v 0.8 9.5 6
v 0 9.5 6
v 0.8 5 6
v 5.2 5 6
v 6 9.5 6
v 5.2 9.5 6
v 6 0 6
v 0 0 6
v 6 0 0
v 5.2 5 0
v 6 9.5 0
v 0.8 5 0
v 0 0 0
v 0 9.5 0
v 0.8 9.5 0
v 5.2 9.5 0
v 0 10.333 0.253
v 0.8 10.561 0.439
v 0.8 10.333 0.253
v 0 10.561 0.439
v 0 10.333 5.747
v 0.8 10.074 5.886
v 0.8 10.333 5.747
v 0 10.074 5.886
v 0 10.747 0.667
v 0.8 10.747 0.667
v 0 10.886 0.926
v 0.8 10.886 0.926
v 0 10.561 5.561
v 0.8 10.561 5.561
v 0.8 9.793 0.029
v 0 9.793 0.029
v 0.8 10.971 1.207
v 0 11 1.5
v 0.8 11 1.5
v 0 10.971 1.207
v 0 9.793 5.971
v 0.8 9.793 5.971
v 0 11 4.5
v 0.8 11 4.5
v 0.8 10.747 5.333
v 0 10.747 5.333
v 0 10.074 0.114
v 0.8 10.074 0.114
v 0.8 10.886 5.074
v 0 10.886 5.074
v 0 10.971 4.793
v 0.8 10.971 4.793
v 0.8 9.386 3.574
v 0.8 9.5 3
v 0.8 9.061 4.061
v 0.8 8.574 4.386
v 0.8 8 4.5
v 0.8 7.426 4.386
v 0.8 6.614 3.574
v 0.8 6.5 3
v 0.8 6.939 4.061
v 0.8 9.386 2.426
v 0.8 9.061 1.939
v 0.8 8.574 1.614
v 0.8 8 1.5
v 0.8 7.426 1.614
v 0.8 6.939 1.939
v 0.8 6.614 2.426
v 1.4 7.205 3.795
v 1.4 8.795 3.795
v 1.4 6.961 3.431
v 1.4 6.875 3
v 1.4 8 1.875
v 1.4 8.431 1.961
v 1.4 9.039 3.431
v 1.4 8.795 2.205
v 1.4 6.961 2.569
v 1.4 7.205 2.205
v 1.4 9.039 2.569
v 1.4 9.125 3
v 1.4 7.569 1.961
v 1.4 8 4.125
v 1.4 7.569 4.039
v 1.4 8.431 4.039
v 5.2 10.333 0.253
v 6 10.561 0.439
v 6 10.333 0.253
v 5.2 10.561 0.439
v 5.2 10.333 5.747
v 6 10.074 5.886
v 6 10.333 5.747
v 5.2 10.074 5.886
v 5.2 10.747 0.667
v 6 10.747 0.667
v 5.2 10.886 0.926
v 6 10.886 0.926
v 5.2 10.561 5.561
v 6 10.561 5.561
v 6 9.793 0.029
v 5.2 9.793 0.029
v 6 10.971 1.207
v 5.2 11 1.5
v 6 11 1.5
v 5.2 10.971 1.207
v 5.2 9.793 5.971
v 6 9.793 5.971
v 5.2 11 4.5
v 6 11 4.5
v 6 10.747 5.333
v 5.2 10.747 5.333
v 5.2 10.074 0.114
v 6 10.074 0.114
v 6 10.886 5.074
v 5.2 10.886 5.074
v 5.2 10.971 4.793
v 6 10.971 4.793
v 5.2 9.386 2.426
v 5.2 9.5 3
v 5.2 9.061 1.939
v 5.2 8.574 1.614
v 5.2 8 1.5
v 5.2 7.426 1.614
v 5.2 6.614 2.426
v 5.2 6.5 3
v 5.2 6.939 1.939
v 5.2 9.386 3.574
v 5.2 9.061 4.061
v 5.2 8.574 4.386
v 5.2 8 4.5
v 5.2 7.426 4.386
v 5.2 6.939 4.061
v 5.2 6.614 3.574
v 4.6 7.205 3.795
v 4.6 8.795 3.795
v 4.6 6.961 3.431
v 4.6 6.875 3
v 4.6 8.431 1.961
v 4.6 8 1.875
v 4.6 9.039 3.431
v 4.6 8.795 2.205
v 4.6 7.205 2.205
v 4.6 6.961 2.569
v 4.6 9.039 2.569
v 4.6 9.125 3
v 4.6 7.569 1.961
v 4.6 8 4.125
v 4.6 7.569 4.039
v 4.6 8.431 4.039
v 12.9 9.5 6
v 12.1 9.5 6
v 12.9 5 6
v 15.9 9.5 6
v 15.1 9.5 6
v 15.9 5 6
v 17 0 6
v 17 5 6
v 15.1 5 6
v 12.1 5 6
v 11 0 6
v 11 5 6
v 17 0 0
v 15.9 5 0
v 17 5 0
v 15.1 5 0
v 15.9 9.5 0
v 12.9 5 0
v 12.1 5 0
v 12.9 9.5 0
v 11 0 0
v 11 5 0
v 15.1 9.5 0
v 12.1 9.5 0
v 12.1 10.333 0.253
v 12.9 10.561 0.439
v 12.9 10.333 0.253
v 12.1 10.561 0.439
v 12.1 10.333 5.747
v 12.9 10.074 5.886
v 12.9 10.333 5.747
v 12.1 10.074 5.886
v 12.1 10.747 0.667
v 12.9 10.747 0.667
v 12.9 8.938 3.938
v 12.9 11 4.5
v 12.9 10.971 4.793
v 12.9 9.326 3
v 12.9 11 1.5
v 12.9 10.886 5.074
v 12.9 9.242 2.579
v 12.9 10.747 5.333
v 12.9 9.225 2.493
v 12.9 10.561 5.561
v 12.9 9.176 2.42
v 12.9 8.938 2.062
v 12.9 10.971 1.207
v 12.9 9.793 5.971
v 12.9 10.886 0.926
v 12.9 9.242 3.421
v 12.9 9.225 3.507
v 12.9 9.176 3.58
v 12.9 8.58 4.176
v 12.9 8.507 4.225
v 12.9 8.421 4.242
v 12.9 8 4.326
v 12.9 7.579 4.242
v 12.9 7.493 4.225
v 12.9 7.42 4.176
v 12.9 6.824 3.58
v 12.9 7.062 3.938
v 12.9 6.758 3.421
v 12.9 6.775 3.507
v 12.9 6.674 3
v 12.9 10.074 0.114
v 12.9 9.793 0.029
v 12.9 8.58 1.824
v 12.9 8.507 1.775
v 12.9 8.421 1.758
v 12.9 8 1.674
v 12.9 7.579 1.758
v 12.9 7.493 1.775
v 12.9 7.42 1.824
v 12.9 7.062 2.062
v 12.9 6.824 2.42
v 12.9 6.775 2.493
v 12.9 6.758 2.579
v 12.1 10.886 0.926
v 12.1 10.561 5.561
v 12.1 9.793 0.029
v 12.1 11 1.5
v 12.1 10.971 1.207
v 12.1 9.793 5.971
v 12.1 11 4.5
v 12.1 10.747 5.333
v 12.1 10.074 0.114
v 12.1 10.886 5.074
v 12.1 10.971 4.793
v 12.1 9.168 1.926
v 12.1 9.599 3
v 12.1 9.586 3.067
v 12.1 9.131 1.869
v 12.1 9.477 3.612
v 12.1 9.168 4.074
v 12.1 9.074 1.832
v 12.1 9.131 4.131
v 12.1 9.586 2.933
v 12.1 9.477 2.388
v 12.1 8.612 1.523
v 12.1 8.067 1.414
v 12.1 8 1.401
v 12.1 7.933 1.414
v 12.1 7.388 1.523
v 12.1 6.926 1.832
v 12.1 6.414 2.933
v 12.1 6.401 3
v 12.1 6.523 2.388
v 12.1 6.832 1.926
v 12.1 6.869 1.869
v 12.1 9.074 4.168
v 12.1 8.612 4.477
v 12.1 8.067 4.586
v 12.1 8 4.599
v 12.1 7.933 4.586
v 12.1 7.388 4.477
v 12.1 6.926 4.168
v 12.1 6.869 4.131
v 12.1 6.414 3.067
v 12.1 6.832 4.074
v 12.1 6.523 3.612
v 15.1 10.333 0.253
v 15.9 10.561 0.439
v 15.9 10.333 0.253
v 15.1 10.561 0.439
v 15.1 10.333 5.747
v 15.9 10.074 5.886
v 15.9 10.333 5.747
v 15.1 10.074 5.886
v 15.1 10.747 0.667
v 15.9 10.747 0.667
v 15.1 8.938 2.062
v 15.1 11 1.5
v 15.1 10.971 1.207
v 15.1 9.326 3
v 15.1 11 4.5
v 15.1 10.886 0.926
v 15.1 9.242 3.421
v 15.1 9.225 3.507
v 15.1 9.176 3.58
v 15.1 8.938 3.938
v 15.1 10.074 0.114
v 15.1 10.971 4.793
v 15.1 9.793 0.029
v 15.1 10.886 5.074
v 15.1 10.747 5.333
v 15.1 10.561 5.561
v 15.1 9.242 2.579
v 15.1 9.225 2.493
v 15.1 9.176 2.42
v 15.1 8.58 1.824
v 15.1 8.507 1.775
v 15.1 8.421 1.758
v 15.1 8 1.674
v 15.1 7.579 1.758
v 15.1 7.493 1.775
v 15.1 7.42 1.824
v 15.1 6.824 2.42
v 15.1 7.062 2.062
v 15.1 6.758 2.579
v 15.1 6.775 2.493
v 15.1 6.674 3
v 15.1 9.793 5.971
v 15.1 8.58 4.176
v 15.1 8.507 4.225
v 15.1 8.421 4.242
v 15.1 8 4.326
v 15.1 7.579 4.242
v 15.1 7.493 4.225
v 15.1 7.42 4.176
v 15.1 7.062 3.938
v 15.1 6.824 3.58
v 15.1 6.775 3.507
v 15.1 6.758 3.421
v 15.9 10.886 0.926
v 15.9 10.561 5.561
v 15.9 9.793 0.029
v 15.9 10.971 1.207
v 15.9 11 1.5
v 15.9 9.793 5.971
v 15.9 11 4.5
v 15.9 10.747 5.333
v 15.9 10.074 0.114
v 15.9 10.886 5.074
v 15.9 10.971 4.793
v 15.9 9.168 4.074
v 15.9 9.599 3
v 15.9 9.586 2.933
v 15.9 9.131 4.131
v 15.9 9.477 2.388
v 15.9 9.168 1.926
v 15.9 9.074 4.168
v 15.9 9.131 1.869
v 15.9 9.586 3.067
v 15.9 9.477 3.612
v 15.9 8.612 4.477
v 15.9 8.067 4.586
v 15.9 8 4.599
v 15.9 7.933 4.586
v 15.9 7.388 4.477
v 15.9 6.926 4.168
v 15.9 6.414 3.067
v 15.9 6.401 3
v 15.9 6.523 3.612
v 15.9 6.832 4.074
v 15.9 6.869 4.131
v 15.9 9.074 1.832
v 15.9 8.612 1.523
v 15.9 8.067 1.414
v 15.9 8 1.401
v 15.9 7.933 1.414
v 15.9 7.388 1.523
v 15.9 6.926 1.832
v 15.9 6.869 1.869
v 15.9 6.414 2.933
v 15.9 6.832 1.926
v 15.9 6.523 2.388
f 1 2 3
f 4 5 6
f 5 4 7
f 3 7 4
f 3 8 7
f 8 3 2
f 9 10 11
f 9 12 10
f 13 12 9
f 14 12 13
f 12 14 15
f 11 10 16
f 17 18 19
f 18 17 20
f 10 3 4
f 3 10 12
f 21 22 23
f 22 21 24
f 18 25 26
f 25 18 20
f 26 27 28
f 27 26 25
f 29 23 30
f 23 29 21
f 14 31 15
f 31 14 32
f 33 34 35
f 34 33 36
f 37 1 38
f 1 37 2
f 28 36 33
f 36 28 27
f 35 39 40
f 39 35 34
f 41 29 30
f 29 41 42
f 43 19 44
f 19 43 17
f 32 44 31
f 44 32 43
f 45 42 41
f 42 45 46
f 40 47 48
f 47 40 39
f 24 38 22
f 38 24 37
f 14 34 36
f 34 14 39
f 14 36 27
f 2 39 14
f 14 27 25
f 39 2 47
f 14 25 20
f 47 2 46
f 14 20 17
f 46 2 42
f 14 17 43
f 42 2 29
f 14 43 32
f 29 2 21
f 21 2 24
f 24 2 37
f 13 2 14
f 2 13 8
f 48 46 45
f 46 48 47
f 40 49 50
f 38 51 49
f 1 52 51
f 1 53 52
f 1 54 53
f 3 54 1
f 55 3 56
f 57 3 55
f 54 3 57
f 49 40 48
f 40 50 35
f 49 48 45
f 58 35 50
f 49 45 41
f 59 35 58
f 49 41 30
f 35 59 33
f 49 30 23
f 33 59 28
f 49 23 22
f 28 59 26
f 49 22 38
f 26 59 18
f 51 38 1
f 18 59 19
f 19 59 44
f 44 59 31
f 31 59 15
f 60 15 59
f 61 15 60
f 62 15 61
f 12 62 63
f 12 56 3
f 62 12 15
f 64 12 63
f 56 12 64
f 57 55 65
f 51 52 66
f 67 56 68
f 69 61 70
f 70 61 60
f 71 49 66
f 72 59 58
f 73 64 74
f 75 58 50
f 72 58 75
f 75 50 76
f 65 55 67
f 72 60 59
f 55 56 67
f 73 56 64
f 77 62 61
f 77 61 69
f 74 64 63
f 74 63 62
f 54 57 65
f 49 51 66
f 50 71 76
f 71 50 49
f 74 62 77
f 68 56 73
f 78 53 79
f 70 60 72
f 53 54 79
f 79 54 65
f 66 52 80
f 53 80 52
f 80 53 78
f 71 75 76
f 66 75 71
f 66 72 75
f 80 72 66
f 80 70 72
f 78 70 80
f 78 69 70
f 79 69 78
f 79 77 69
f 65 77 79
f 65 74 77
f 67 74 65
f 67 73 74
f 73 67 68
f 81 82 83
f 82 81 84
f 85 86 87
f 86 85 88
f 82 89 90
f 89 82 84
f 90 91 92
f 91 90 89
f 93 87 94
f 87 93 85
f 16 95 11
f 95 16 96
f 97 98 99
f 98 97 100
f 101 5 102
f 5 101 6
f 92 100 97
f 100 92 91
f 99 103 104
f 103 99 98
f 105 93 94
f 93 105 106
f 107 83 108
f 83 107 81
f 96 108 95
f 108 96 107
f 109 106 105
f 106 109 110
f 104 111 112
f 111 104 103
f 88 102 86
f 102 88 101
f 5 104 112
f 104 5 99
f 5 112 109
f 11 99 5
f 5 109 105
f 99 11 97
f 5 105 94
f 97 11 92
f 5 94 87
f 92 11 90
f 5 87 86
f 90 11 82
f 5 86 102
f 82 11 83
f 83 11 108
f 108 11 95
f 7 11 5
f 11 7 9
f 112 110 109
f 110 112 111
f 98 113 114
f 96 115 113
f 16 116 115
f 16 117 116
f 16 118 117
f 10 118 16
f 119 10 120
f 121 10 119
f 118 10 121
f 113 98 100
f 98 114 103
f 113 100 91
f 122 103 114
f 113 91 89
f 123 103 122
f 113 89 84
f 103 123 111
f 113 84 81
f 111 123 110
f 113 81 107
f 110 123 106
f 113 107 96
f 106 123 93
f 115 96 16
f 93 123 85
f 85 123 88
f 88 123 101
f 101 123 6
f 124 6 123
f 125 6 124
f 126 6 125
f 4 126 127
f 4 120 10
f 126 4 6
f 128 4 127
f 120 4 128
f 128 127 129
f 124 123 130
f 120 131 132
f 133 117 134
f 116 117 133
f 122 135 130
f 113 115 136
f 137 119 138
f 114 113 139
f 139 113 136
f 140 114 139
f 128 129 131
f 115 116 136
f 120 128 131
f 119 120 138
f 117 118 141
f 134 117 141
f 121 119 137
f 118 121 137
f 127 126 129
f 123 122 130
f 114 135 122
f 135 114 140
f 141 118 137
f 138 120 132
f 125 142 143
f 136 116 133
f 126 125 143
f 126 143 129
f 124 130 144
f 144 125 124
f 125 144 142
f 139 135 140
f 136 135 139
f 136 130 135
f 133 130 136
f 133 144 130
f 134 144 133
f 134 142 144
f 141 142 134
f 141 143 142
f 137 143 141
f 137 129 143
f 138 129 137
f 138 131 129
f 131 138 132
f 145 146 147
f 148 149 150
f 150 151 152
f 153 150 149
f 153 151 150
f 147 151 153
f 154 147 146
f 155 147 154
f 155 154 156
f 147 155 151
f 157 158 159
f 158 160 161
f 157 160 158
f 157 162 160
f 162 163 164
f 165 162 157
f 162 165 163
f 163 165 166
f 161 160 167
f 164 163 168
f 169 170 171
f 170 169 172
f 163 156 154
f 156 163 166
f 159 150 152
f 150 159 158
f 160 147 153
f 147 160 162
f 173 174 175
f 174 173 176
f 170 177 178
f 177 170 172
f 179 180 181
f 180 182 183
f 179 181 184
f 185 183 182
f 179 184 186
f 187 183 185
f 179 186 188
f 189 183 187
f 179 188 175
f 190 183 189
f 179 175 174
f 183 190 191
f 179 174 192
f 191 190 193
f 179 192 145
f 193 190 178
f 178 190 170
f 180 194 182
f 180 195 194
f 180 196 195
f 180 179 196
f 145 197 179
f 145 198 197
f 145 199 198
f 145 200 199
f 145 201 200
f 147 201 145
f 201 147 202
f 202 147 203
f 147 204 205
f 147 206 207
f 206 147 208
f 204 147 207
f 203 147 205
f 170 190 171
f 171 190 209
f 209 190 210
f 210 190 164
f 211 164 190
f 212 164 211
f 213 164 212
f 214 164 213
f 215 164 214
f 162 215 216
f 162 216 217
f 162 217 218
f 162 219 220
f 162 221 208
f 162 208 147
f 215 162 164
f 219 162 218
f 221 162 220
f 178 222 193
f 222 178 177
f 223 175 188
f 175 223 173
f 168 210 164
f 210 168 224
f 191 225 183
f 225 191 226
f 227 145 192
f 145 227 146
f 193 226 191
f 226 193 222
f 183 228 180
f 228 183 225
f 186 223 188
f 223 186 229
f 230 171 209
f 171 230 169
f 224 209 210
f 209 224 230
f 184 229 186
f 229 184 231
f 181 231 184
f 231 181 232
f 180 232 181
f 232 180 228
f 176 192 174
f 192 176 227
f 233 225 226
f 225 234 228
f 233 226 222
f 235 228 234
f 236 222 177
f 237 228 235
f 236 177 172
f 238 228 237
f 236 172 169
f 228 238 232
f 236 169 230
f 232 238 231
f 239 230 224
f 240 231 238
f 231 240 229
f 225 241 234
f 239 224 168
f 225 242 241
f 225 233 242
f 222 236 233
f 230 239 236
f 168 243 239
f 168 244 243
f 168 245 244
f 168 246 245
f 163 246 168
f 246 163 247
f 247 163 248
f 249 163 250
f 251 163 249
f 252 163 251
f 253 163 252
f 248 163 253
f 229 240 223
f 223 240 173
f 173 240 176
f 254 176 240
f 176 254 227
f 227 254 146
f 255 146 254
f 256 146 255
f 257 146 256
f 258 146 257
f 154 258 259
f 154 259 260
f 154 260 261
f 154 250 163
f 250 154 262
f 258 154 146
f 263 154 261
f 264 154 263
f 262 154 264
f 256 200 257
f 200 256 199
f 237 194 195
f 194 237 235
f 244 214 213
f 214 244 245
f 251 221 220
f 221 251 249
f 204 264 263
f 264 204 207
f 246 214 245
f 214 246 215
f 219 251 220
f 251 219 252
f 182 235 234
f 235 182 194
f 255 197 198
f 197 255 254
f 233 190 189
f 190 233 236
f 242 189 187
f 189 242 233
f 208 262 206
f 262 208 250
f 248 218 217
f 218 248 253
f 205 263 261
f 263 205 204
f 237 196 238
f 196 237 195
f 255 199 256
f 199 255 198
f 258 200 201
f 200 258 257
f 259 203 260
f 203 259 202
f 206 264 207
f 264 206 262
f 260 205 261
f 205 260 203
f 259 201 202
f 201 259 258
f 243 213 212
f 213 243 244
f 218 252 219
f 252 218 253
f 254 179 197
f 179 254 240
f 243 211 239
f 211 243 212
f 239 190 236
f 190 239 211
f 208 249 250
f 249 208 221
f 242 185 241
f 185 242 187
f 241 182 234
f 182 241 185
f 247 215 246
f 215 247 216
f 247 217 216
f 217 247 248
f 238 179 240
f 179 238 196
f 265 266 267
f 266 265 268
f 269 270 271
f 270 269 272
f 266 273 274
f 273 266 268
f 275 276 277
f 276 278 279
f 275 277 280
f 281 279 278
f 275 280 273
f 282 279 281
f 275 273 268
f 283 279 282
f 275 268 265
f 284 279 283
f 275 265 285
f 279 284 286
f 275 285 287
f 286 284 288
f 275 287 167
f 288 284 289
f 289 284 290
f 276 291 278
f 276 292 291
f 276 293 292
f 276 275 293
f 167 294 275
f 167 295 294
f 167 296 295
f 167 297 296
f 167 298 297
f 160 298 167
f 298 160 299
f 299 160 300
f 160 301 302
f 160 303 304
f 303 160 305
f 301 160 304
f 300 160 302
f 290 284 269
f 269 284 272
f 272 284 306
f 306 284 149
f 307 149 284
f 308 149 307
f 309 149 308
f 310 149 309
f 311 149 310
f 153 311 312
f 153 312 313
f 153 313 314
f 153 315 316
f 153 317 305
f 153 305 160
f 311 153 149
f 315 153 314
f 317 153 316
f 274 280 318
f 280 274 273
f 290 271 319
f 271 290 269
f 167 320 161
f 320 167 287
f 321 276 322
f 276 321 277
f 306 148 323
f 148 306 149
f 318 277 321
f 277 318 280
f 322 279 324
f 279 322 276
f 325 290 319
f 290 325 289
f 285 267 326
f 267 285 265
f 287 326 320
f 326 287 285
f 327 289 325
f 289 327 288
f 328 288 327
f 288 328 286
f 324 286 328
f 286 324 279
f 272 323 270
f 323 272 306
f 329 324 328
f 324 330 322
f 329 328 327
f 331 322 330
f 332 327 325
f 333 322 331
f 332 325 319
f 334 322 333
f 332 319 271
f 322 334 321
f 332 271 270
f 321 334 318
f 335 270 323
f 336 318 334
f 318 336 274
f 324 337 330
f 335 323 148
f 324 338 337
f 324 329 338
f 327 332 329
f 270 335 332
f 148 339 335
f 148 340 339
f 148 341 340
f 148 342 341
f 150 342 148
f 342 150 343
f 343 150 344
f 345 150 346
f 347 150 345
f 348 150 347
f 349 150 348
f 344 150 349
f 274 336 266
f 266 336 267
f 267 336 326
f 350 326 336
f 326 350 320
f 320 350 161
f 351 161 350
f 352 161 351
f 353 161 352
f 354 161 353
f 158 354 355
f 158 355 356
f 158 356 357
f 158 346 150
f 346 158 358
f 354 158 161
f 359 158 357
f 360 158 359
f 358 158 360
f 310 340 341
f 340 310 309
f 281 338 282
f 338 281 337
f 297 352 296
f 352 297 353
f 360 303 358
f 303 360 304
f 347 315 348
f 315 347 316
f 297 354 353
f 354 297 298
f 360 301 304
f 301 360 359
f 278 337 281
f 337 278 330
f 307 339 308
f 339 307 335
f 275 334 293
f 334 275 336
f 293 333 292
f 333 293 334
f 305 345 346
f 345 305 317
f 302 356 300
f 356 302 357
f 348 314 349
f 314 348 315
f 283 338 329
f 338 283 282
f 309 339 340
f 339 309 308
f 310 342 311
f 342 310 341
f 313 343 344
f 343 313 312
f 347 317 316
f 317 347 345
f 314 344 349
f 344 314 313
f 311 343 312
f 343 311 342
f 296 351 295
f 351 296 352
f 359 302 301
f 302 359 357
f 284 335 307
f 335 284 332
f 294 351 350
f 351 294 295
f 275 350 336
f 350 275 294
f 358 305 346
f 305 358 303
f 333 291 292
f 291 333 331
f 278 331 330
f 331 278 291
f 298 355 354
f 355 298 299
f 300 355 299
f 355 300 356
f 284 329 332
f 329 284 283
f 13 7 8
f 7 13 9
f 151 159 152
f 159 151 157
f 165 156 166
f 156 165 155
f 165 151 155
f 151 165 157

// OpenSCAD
// file: common/joint-v2/wall.scad
include <../helpers/getValue.scad>

module joint_wall_side(
    SIZE,
    CORNER_RADIUS,
    fn = 32
) {
    SIZE_X = getValue(SIZE[0], 1);
    SIZE_Y = getValue(SIZE[1], 5);
    SIZE_Z = getValue(SIZE[2], 5);
    _CR = getValue(CORNER_RADIUS, SIZE_Z / 4);
    if (_CR == 0) {
        cube([SIZE_X, SIZE_Y, SIZE_Z]);
    } else {
        hull() {
            cube([SIZE_X, 1, SIZE_Z]);

            translate([0, SIZE_Y - _CR , 0]) {
                translate([0, 0, _CR])
                    rotate([0, 90, 0])
                        cylinder(r=_CR, h=SIZE_X, $fn=fn);

                translate([0, 0, SIZE_Z - _CR])
                    rotate([0, 90, 0])
                        cylinder(r=_CR, h=SIZE_X, $fn=fn);
            }
        }
    }
}
// file: common/helpers/getValue.scad
function getValue(variable, default) = variable == undef ? default : variable;
// file: common/joint-v2/chain.scad
include <../helpers/getValue.scad>

_CHAIN_DEFAULT_X = 1;
_CHAIN_DEFAULT_Y = 5;
_CHAIN_DEFAULT_Z = 5;

_CHAIN_DEFAULT_TOLERANCE = 0.3;

_CHAIN_DEFALLT_TYPE = "male";

module chain_joint_side(TYPE = _CHAIN_DEFALLT_TYPE, SIZE, CORNER_RADIUS, R, R2_KOEF, H, TOLERANCE = _CHAIN_DEFAULT_TOLERANCE) {
    SIZE_X = getValue(SIZE[0], _CHAIN_DEFAULT_X);
    SIZE_Y = getValue(SIZE[1], _CHAIN_DEFAULT_Y);
    SIZE_Z = getValue(SIZE[2], _CHAIN_DEFAULT_Z);

    include <./wall.scad>

    _CR1 = getValue(R, SIZE_Z / 4);
    _CR2 = getValue(R2_KOEF, 0.75) * _CR1;
    _CH = getValue(H, SIZE_X * 0.75);

    DIFF = SIZE_Z / 2 - _CR1;

    if (TYPE == "male") {
        union() {
            joint_wall_side(SIZE, CORNER_RADIUS);

            translate([SIZE_X, SIZE_Y - _CR1 - DIFF, SIZE_Z / 2])
                rotate([0, 90, 0])
                    cylinder(r1=_CR1, r2=_CR2, h=_CH, $fn = 16);
        }
    } else {
        difference() {
            joint_wall_side(SIZE, CORNER_RADIUS);

            translate([SIZE_X + TOLERANCE / 2, SIZE_Y - _CR1 - DIFF, SIZE_Z / 2])
                rotate([0, 270, 0])
                    cylinder(r2=_CR1 + TOLERANCE / 2, r1=_CR2 + TOLERANCE / 2, h=SIZE_X + TOLERANCE, $fn = 16);
        }
    }
}

module chain_joint(TYPE = _CHAIN_DEFALLT_TYPE, SIZE, CORNER_RADIUS, WALL_THICKNESS = _CHAIN_DEFAULT_X, R, R2_KOEF, H, TOLERANCE = _CHAIN_DEFAULT_TOLERANCE) {
    SIZE_X = getValue(SIZE[0], _CHAIN_DEFAULT_X);
    SIZE_Y = getValue(SIZE[1], _CHAIN_DEFAULT_Y);
    SIZE_Z = getValue(SIZE[2], _CHAIN_DEFAULT_Z);

    SIDE_SIZE = [WALL_THICKNESS, SIZE_Y, SIZE_Z];

    MOVE_X = TYPE == "male" ? 0 : WALL_THICKNESS + TOLERANCE;

    translate([MOVE_X, 0, 0]) chain_joint_side(TYPE, SIDE_SIZE, CORNER_RADIUS, R, R2_KOEF, H, TOLERANCE);
    translate([SIZE_X - MOVE_X, 0, 0])
        mirror([1, 0, 0]) chain_joint_side(TYPE, SIDE_SIZE, CORNER_RADIUS, R, R2_KOEF, H, TOLERANCE);
}
// main file
include <./common/joint-v2/chain.scad>

module test(_SIZE, _THICKNESS) {
    cube([_SIZE[0], 5, _SIZE[2]]);
    translate([_SIZE[0] + 5, 0, 0]) cube([_SIZE[0], 5, _SIZE[2]]);
    translate([0, 5, 0]) {
        chain_joint(TYPE="male", SIZE=_SIZE, WALL_THICKNESS=_THICKNESS);
        translate([_SIZE[0] + 5, 0, 0]) chain_joint(TYPE="female", SIZE=_SIZE, WALL_THICKNESS=_THICKNESS);
    }
}

test([6, 6, 6], 0.8);
